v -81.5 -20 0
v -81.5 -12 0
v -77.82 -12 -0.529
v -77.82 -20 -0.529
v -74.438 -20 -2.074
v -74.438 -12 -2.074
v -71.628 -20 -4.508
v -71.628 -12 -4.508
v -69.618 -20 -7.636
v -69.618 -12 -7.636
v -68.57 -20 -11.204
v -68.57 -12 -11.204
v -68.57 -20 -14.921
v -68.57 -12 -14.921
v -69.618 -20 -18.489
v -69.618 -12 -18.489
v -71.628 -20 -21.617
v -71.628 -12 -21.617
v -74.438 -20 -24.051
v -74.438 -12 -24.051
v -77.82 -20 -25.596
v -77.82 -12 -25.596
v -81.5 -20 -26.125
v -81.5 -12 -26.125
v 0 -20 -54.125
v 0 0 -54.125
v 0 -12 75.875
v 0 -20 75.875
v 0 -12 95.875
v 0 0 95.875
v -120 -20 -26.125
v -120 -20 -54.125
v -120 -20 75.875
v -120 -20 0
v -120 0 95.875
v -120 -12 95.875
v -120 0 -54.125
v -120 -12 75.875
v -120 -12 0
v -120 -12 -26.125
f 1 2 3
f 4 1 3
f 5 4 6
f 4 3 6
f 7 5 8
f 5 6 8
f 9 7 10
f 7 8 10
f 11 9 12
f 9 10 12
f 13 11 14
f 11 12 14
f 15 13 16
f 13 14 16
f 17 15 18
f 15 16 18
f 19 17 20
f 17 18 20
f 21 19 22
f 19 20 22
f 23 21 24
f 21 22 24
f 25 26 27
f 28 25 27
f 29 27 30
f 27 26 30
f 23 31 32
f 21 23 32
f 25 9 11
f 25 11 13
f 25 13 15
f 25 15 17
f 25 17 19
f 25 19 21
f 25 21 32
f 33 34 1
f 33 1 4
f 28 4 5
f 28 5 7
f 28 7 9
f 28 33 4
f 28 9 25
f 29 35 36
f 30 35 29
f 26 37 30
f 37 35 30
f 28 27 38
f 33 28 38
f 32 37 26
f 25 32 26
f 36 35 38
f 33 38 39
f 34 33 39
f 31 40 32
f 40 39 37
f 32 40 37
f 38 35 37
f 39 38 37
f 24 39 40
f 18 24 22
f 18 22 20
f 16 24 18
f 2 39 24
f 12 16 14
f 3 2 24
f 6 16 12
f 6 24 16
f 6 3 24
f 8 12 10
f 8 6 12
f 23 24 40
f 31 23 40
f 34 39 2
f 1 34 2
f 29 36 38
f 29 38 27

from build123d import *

# Parameters (mm, degrees)
F0_W     = 120
F0_H     = 20
F1_DEPTH = 12
F2_DEPTH = 20
F3_DEPTH = 20
F4_DEPTH = 20
F5_DEPTH = 12


with BuildPart() as f1:
    # F0 (on Front) → F1 (new body)
    with BuildSketch(Plane.XZ):
        with Locations((-60, 85.875011)):
            Rectangle(F0_W, F0_H)
    extrude(amount=F1_DEPTH)

    # F0 (on Front) → F2 (join)
    with BuildSketch(Plane.XZ):
        Polygon((0, 75.875011), (-120, 75.875011), (-120, 0), (-81.5, 0), (0, 0), align=None)
    extrude(amount=F2_DEPTH)

    # F0 (on Front) → F3 (join)
    with BuildSketch(Plane.XZ):
        with BuildLine():
            Line((0, 0), (-81.5, 0))
            ThreePointArc((-81.5, 0), (-68.437506, -13.062494), (-81.5, -26.124989))
            Line((-81.5, -26.124989), (0, -26.124989))
            Line((0, -26.124989), (0, -1.124989))
            Line((0, -1.124989), (0, 0))
        make_face()
    extrude(amount=F3_DEPTH)

    # F0 (on Front) → F4 (join)
    with BuildSketch(Plane.XZ):
        Polygon((-81.5, -26.124989), (-120, -26.124989), (-120, -54.124989), (0, -54.124989), (0, -26.124989), align=None)
    extrude(amount=F4_DEPTH)

    # F0 (on Front) → F5 (join)
    with BuildSketch(Plane.XZ):
        with BuildLine():
            Line((-81.5, 0), (-120, 0))
            Line((-120, 0), (-120, -26.124989))
            Line((-120, -26.124989), (-81.5, -26.124989))
            ThreePointArc((-81.5, -26.124989), (-68.437506, -13.062494), (-81.5, 0))
        make_face()
    extrude(amount=F5_DEPTH)


solid = f1.part
